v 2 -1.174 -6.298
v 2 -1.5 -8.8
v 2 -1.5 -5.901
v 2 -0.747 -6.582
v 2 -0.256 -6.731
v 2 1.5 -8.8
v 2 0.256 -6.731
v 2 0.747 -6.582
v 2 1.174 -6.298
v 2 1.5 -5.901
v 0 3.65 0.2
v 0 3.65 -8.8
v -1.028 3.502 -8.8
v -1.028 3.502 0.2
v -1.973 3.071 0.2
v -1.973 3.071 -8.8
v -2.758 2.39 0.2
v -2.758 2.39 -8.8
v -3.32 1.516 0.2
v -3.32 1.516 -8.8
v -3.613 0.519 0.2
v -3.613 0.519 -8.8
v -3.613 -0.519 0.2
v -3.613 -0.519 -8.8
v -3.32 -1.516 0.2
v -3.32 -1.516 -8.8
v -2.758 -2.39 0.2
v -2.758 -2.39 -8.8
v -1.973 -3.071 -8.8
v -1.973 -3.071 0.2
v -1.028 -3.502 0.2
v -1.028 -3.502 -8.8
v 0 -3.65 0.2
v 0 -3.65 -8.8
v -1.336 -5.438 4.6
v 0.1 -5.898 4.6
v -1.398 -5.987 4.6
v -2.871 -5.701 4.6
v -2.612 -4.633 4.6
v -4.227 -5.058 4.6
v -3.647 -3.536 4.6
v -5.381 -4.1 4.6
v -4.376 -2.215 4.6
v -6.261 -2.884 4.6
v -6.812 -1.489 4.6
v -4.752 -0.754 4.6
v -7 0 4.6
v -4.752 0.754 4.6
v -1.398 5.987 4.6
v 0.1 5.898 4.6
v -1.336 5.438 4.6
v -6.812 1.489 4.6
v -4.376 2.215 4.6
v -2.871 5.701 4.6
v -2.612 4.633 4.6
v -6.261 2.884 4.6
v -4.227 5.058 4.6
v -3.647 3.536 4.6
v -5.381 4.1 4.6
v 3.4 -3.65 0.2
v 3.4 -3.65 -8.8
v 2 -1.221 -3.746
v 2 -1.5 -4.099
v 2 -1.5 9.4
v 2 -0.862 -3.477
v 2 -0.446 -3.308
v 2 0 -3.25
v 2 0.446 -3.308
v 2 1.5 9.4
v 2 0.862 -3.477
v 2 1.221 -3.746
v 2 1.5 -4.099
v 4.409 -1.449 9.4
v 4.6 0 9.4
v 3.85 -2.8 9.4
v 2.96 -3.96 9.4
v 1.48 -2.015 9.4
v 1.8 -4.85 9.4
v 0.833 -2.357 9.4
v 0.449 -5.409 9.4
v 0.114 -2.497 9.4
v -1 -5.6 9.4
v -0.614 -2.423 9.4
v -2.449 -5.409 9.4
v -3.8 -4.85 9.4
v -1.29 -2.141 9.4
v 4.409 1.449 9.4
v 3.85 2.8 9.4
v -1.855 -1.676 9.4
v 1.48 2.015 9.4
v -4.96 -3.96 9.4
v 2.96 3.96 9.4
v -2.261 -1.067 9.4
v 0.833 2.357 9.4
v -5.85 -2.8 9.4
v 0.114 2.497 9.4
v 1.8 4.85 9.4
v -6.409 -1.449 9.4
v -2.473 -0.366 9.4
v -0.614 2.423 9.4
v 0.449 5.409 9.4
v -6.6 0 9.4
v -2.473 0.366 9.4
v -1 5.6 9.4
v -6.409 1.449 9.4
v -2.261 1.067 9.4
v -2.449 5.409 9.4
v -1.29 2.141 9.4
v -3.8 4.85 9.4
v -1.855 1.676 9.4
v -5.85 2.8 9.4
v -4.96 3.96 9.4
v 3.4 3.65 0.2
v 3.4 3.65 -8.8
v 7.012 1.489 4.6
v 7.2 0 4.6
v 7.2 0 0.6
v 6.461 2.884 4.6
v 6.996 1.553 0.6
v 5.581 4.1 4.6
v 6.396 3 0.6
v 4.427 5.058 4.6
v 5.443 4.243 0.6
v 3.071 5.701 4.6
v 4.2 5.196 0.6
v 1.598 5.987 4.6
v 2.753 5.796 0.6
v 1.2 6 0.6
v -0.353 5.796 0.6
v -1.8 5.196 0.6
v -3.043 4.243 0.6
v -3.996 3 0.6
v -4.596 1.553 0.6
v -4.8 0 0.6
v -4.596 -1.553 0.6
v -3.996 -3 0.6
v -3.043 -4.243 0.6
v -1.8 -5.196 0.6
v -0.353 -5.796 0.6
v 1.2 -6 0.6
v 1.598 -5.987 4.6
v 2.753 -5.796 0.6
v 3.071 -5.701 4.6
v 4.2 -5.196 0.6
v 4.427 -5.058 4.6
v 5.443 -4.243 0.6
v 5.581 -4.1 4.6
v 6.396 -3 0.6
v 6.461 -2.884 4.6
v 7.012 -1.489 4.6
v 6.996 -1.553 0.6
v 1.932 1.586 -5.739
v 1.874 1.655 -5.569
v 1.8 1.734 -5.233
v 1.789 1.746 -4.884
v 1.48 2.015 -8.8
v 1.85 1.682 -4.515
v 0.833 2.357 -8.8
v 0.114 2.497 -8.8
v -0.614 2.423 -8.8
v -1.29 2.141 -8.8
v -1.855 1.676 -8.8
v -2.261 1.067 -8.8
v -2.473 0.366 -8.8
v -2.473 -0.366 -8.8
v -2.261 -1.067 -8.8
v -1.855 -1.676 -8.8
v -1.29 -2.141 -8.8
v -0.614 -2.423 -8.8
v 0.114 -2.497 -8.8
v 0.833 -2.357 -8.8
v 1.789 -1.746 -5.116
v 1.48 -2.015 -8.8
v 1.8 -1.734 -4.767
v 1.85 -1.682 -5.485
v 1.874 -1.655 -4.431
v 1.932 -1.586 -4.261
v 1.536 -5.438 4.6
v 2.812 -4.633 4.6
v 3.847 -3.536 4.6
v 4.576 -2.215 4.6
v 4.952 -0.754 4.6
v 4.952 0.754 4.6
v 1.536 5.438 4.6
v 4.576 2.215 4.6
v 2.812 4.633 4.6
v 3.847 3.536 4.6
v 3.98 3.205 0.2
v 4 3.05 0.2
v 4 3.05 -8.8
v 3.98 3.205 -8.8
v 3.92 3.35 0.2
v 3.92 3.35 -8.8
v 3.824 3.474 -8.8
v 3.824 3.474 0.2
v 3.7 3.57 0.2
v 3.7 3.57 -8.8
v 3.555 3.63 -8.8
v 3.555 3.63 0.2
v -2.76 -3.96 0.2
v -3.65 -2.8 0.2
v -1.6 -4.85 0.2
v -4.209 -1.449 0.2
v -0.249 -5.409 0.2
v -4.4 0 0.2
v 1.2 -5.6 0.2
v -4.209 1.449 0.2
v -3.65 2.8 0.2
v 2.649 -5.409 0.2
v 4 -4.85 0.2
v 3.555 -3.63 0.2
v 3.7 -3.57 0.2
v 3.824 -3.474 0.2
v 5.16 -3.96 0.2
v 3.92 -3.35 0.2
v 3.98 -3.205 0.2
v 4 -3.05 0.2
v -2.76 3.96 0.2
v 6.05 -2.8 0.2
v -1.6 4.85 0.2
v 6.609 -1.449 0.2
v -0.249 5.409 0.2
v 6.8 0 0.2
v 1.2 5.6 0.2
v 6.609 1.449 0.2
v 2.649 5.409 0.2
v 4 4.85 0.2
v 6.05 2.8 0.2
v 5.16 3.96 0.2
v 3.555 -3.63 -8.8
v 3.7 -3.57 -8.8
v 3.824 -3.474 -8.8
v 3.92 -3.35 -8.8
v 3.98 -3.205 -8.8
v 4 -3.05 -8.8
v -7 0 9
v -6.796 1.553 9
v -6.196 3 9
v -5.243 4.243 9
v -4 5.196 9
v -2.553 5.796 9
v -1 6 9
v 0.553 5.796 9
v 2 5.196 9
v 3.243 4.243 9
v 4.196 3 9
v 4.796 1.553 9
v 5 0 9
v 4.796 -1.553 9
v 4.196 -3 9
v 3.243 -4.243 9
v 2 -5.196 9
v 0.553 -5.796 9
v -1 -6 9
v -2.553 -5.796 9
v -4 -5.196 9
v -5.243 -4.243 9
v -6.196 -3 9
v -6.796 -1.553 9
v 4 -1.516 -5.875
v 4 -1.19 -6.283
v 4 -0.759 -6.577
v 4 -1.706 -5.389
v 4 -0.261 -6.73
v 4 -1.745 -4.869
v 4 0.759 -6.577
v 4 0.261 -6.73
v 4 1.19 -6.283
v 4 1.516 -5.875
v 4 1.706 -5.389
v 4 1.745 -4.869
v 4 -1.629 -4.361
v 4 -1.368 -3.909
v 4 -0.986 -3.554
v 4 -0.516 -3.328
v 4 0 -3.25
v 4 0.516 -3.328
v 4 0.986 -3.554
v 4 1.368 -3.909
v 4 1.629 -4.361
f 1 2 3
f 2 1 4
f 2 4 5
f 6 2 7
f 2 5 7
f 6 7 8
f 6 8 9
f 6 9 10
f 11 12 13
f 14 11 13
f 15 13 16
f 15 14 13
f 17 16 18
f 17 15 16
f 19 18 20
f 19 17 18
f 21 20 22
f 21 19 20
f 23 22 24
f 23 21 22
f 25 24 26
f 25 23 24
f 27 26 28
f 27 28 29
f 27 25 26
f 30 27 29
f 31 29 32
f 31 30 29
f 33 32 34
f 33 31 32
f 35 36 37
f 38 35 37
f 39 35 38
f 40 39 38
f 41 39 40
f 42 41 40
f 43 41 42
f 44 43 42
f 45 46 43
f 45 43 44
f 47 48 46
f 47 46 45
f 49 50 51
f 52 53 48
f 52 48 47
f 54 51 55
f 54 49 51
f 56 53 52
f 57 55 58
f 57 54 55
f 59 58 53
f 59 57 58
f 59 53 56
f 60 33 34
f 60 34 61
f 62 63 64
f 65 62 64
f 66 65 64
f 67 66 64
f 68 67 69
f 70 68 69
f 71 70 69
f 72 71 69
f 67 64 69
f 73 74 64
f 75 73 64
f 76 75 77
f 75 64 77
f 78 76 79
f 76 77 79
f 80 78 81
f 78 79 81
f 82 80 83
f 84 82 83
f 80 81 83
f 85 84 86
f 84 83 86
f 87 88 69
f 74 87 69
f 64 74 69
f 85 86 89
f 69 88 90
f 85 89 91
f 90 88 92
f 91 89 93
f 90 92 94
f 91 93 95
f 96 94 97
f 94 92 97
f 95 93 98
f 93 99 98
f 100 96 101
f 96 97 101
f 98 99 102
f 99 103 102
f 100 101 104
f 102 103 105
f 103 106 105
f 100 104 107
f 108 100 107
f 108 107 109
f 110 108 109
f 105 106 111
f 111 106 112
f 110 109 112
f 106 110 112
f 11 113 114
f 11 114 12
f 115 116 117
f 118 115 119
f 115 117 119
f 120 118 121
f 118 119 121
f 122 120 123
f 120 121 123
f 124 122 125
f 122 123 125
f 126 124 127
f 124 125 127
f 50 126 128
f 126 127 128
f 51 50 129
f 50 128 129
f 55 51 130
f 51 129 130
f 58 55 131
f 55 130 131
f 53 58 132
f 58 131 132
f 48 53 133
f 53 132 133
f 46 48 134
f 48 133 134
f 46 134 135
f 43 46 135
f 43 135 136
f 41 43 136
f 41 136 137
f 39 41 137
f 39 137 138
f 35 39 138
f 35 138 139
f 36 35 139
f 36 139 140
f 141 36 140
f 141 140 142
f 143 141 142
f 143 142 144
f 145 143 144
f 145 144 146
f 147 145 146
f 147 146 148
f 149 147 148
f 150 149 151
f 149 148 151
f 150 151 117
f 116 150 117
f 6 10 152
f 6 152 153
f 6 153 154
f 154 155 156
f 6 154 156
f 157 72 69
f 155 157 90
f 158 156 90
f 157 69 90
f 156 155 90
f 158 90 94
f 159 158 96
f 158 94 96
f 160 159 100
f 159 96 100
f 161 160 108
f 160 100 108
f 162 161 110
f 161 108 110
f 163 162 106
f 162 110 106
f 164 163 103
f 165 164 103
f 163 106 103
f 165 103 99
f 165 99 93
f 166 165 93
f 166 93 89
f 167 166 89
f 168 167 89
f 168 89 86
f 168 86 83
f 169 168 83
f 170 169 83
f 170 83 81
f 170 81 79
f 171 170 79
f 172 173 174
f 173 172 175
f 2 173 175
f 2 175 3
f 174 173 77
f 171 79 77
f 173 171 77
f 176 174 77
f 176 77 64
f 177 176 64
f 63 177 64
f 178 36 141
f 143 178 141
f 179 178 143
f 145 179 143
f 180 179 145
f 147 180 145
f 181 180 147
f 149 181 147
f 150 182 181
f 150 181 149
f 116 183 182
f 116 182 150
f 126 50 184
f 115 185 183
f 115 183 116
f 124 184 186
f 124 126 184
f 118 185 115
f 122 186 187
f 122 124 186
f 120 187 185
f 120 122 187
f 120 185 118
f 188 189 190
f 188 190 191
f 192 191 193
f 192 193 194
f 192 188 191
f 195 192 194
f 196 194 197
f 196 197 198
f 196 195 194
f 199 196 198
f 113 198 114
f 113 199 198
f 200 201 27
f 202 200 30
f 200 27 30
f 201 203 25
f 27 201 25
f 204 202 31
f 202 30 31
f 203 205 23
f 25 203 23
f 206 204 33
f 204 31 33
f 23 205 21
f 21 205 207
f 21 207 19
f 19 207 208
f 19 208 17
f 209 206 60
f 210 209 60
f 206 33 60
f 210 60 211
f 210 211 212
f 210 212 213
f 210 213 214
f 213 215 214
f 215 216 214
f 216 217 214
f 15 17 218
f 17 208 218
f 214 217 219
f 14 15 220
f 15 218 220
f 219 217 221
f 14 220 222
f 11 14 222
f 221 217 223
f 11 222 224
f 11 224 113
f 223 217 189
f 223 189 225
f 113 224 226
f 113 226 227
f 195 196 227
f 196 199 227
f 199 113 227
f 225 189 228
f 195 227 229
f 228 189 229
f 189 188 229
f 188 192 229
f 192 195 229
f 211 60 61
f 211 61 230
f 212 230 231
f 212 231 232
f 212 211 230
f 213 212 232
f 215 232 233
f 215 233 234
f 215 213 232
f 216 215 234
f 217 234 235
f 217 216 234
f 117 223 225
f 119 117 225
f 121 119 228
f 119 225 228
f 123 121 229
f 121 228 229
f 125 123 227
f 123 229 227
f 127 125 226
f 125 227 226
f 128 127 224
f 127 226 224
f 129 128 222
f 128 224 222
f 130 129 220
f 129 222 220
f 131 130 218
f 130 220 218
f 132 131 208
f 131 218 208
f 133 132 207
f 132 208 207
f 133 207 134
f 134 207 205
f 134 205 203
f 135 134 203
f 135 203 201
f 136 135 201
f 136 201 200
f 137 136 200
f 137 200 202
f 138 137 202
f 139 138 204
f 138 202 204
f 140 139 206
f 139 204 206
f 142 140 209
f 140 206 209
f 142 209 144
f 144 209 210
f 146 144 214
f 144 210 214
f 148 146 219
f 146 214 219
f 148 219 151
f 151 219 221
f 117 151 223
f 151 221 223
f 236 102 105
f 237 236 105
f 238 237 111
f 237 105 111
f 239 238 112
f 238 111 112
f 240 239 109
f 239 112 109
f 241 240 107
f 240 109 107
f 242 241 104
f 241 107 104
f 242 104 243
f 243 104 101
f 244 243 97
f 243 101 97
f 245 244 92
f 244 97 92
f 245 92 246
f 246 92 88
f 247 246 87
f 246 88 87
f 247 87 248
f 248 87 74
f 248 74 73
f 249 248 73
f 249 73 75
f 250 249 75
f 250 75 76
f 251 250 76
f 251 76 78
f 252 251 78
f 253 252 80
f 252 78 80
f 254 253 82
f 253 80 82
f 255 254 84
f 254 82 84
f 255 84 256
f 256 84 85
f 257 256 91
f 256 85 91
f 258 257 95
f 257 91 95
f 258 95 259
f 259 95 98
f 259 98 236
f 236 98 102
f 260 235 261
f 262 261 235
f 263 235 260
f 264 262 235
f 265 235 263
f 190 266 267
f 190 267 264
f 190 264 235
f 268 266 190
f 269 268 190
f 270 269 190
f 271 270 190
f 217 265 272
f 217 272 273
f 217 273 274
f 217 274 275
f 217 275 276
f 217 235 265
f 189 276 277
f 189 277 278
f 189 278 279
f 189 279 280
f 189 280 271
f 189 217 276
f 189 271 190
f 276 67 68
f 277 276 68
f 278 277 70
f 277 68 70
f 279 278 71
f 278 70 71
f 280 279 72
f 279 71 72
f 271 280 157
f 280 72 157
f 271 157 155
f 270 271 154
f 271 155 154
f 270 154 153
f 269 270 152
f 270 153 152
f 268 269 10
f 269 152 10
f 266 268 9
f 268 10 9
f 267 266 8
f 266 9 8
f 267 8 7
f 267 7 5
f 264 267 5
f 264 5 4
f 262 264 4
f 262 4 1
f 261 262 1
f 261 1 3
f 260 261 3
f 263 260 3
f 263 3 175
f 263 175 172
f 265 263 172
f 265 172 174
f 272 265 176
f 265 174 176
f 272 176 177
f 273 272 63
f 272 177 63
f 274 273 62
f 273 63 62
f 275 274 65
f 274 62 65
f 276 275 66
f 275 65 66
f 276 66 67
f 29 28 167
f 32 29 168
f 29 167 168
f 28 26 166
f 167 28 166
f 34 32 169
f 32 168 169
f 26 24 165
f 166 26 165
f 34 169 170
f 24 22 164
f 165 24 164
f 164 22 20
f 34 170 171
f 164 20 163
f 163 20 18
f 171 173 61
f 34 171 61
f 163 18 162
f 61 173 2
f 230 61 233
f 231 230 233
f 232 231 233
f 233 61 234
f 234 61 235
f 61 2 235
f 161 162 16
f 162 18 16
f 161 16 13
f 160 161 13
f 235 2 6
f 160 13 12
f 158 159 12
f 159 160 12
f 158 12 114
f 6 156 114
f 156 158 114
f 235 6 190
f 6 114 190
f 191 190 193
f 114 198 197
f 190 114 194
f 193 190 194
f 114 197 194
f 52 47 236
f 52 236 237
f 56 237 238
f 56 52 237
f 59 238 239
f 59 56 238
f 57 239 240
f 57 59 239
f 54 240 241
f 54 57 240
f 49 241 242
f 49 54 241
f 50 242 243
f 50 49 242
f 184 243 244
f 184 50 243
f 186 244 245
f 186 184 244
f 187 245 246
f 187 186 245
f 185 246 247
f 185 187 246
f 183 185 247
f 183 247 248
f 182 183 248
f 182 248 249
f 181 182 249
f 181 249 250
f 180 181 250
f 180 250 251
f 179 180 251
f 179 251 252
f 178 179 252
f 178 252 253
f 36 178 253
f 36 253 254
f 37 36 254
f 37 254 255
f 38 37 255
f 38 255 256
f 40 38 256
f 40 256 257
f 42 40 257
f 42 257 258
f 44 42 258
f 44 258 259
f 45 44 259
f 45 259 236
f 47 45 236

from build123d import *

# Parameters (mm, degrees)
BOSS_EXTRUDE4_DEPTH            = 4.2
BOSS_EXTRUDE4_DEPTH_BACK       = 0.2
SKETCH10_R                     = 6
BOSS_EXTRUDE5_DEPTH            = 9
SKETCH16_R                     = 6
BOSS_EXTRUDE6_DEPTH            = 4.8
CUT_EXTRUDE2_DEPTH             = 21.471443525
F_3_5_3_5_DIAMETER_HOLE0_D     = 3.5
F_3_5_3_5_DIAMETER_HOLE0_DEPTH = 4
F_3_5_3_5_DIAMETER_HOLE0_TIP   = 1.051506083
CHAMFER2_SIZE                  = 0.4


with BuildPart() as part:
    # Sketch10 → Boss-Extrude4 (new, two sides: drawn at the far end of the back side and taken through both)
    with BuildSketch(Plane.XY.offset(0.4).offset(-BOSS_EXTRUDE4_DEPTH_BACK)):
        with Locations((1.2, 0)):
            Circle(SKETCH10_R)
    extrude(amount=BOSS_EXTRUDE4_DEPTH + BOSS_EXTRUDE4_DEPTH_BACK)

    # Sketch11 → Boss-Extrude5 (add)
    with BuildSketch(Plane(origin=(0, 0, 0.2), x_dir=(-1, 0, 0), z_dir=(0, 0, -1))):
        with BuildLine():
            Line((-4, -3.05), (-4, 3.05))
            ThreePointArc((-4, 3.05), (-3.824264069, 3.474264069), (-3.4, 3.65))
            Line((-3.4, 3.65), (0, 3.65))
            ThreePointArc((0, 3.65), (3.65, 0), (0, -3.65))
            Line((0, -3.65), (-3.4, -3.65))
            ThreePointArc((-3.4, -3.65), (-3.824264069, -3.474264069), (-4, -3.05))
        make_face()
    extrude(amount=BOSS_EXTRUDE5_DEPTH)

    # Sketch16 → Boss-Extrude6 (add)
    with BuildSketch(Plane(origin=(0, 0, 4.6), x_dir=(-1, 0, 0), z_dir=(0, 0, -1))):
        with Locations((1, 0)):
            Circle(SKETCH16_R)
    extrude(amount=-BOSS_EXTRUDE6_DEPTH)

    # Sketch17 → Cut-Extrude2 (cut, through all)
    with BuildSketch(Plane.XY.offset(9.4)):
        with BuildLine():
            Line((2, -1.5), (2, 1.5))
            ThreePointArc((2, 1.5), (-2.5, 0), (2, -1.5))
        make_face()
    extrude(amount=-CUT_EXTRUDE2_DEPTH, mode=Mode.SUBTRACT)

    # Ø3.5 (3.5) Diameter Hole0
    with Locations(Plane(origin=(4, 0, 0), x_dir=(0, 0, -1), z_dir=(1, 0, 0))):
        with Locations((5, 0)):
            Hole(F_3_5_3_5_DIAMETER_HOLE0_D / 2, depth=F_3_5_3_5_DIAMETER_HOLE0_DEPTH)
            with Locations((0, 0, -(F_3_5_3_5_DIAMETER_HOLE0_DEPTH + F_3_5_3_5_DIAMETER_HOLE0_TIP / 2))):  # 118° drill point
                Cone(0, F_3_5_3_5_DIAMETER_HOLE0_D / 2, F_3_5_3_5_DIAMETER_HOLE0_TIP, mode=Mode.SUBTRACT)

    # Chamfer2
    chamfer2_edges = [part.edges().sort_by_distance(p)[0] for p in [
        (5, 0, 9.4),
        (-4.8, 0, 0.2),
    ]]
    chamfer(chamfer2_edges, length=CHAMFER2_SIZE)


solid = part.part
